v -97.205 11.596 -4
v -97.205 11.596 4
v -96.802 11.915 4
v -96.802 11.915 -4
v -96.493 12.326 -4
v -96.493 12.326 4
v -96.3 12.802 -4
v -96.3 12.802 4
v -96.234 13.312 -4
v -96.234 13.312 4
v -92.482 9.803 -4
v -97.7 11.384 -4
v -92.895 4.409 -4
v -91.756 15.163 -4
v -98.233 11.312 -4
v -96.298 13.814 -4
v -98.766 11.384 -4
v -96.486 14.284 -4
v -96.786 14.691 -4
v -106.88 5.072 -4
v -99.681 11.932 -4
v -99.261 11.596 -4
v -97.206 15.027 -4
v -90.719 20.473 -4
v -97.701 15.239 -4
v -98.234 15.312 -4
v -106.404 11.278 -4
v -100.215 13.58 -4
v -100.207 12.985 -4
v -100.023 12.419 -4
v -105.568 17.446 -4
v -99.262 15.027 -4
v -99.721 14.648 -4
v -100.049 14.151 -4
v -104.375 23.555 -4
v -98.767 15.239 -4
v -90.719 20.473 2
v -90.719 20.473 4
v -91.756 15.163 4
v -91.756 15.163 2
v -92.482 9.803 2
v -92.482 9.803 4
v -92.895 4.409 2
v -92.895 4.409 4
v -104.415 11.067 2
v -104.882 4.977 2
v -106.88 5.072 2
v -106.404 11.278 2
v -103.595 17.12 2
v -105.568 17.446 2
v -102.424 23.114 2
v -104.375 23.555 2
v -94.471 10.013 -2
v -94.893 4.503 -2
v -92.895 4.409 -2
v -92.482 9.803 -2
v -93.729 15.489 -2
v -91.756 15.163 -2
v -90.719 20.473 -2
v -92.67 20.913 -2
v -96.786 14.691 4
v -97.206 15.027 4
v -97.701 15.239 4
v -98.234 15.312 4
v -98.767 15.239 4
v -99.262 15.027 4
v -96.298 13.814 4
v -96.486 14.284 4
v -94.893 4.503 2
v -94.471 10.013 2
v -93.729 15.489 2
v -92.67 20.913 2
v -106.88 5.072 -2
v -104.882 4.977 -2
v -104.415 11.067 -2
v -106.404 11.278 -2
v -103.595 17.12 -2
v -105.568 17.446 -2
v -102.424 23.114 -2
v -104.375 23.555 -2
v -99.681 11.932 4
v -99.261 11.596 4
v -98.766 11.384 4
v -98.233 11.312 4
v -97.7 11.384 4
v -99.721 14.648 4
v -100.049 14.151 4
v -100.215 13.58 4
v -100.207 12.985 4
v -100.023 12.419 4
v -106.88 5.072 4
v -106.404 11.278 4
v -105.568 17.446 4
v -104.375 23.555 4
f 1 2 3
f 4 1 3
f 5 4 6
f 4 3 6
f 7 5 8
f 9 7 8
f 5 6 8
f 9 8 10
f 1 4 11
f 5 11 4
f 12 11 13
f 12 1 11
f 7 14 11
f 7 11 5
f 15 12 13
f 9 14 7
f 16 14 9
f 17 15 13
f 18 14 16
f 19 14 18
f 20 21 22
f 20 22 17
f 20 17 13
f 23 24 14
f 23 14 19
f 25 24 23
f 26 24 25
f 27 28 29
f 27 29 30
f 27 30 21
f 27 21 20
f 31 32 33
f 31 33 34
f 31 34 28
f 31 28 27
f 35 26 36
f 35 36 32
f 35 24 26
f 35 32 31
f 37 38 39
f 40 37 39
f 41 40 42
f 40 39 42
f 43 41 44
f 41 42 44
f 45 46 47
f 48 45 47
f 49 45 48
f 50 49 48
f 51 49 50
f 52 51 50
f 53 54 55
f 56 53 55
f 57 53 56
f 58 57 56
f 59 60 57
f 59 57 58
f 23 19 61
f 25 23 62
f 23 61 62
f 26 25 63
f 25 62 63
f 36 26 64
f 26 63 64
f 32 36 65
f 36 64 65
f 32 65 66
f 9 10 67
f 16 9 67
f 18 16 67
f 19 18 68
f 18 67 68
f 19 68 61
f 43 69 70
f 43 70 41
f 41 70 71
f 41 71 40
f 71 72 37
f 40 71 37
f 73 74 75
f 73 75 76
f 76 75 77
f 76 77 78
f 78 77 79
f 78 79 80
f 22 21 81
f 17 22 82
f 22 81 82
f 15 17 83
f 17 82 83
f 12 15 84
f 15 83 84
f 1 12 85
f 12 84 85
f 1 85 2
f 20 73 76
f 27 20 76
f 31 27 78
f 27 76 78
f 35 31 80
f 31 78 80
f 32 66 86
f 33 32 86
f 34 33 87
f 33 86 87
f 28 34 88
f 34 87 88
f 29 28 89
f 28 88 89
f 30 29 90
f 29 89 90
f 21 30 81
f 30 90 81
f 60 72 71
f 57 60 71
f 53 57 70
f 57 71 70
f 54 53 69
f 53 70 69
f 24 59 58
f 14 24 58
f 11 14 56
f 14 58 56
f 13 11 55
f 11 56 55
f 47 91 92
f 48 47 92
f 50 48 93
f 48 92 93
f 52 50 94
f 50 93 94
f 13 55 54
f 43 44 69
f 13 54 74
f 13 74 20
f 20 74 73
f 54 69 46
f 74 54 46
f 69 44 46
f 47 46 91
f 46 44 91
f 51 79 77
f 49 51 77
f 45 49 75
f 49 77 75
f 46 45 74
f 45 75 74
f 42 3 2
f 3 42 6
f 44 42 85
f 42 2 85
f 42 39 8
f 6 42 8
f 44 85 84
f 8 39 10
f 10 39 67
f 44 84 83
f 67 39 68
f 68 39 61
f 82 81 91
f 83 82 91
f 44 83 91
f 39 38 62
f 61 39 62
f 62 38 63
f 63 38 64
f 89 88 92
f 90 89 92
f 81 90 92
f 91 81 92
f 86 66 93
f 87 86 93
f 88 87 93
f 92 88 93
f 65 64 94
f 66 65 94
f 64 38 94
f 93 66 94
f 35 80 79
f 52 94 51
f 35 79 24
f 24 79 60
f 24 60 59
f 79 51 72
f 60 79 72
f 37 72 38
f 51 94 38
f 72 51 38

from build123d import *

# Parameters (mm, degrees)
EXTRUDE_1_DEPTH          = 4
CUT_EXTRUDE_1_DEPTH      = 2
CUT_EXTRUDE_1_DEPTH_BACK = 2
CUT_EXTRUDE_2_DEPTH      = 9


with BuildPart() as part:
    # 草图1 → 凸台-拉伸1 (new body, symmetric)
    with BuildSketch(Plane.XY):
        with BuildLine():
            Line((-92.895446795, 4.408623913), (-106.879707603, 5.072287728))
            ThreePointArc((-106.879707603, 5.072287728), (-106.030919043, 14.368166442), (-104.375171166, 23.554694734))
            Line((-104.375171166, 23.554694734), (-90.718606715, 20.472772059))
            ThreePointArc((-90.718606715, 20.472772059), (-92.157714682, 12.488219431), (-92.895446795, 4.408623913))
        make_face()
    extrude(amount=EXTRUDE_1_DEPTH, both=True)

    # 草图2 → 切除-拉伸1 (cut, two sides)
    with BuildSketch(Plane.XY) as cut_extrude_1_sk:
        with BuildLine():
            Line((-104.881956059, 4.977478611), (-106.879707603, 5.072287728))
            ThreePointArc((-106.879707603, 5.072287728), (-106.030919043, 14.368166442), (-104.375171166, 23.554694734))
            Line((-104.375171166, 23.554694734), (-102.424233387, 23.114420066))
            ThreePointArc((-102.424233387, 23.114420066), (-104.049032706, 14.099602583), (-104.881956059, 4.977478611))
        make_face()
        with BuildLine():
            Line((-80.070774139, 18.069839991), (-92.669544493, 20.913046727))
            ThreePointArc((-92.669544493, 20.913046727), (-94.139601019, 12.75678329), (-94.893198339, 4.503433029))
            Line((-94.893198339, 4.503433029), (-81.992113947, 3.891174505))
            ThreePointArc((-81.992113947, 3.891174505), (-81.340970995, 11.022451002), (-80.070774139, 18.069839991))
        make_face()
    extrude(amount=CUT_EXTRUDE_1_DEPTH, mode=Mode.SUBTRACT)
    extrude(cut_extrude_1_sk.sketch, amount=-CUT_EXTRUDE_1_DEPTH_BACK, mode=Mode.SUBTRACT)

    # 草图3 → 切除-拉伸2 (cut, through all)
    with BuildSketch(Plane.XY.offset(4)):
        with BuildLine():
            ThreePointArc((-96.785643699, 14.691278047), (-97.964954769, 15.293433182), (-99.261988484, 15.026845581))
            Line((-99.261988484, 15.026845581), (-98.233518627, 13.311546845))
            Line((-98.233518627, 13.311546845), (-96.785643699, 14.691278047))
        make_face()
        with BuildLine():
            Line((-98.233518627, 13.311546845), (-99.261988484, 15.026845581))
            ThreePointArc((-99.261988484, 15.026845581), (-100.215404965, 13.580110704), (-99.681393556, 11.931815643))
            Line((-99.681393556, 11.931815643), (-98.233518627, 13.311546845))
        make_face()
        with BuildLine():
            Line((-96.785643699, 14.691278047), (-98.233518627, 13.311546845))
            Line((-98.233518627, 13.311546845), (-97.205048771, 11.596248109))
            ThreePointArc((-97.205048771, 11.596248109), (-96.493268687, 12.325884558), (-96.233518627, 13.311546845))
            ThreePointArc((-96.233518627, 13.311546845), (-96.376673203, 14.054598035), (-96.785643699, 14.691278047))
        make_face()
        with BuildLine():
            Line((-97.205048771, 11.596248109), (-98.233518627, 13.311546845))
            Line((-98.233518627, 13.311546845), (-99.681393556, 11.931815643))
            ThreePointArc((-99.681393556, 11.931815643), (-98.502082486, 11.329660508), (-97.205048771, 11.596248109))
        make_face()
    extrude(amount=-CUT_EXTRUDE_2_DEPTH, mode=Mode.SUBTRACT)


solid = part.part
